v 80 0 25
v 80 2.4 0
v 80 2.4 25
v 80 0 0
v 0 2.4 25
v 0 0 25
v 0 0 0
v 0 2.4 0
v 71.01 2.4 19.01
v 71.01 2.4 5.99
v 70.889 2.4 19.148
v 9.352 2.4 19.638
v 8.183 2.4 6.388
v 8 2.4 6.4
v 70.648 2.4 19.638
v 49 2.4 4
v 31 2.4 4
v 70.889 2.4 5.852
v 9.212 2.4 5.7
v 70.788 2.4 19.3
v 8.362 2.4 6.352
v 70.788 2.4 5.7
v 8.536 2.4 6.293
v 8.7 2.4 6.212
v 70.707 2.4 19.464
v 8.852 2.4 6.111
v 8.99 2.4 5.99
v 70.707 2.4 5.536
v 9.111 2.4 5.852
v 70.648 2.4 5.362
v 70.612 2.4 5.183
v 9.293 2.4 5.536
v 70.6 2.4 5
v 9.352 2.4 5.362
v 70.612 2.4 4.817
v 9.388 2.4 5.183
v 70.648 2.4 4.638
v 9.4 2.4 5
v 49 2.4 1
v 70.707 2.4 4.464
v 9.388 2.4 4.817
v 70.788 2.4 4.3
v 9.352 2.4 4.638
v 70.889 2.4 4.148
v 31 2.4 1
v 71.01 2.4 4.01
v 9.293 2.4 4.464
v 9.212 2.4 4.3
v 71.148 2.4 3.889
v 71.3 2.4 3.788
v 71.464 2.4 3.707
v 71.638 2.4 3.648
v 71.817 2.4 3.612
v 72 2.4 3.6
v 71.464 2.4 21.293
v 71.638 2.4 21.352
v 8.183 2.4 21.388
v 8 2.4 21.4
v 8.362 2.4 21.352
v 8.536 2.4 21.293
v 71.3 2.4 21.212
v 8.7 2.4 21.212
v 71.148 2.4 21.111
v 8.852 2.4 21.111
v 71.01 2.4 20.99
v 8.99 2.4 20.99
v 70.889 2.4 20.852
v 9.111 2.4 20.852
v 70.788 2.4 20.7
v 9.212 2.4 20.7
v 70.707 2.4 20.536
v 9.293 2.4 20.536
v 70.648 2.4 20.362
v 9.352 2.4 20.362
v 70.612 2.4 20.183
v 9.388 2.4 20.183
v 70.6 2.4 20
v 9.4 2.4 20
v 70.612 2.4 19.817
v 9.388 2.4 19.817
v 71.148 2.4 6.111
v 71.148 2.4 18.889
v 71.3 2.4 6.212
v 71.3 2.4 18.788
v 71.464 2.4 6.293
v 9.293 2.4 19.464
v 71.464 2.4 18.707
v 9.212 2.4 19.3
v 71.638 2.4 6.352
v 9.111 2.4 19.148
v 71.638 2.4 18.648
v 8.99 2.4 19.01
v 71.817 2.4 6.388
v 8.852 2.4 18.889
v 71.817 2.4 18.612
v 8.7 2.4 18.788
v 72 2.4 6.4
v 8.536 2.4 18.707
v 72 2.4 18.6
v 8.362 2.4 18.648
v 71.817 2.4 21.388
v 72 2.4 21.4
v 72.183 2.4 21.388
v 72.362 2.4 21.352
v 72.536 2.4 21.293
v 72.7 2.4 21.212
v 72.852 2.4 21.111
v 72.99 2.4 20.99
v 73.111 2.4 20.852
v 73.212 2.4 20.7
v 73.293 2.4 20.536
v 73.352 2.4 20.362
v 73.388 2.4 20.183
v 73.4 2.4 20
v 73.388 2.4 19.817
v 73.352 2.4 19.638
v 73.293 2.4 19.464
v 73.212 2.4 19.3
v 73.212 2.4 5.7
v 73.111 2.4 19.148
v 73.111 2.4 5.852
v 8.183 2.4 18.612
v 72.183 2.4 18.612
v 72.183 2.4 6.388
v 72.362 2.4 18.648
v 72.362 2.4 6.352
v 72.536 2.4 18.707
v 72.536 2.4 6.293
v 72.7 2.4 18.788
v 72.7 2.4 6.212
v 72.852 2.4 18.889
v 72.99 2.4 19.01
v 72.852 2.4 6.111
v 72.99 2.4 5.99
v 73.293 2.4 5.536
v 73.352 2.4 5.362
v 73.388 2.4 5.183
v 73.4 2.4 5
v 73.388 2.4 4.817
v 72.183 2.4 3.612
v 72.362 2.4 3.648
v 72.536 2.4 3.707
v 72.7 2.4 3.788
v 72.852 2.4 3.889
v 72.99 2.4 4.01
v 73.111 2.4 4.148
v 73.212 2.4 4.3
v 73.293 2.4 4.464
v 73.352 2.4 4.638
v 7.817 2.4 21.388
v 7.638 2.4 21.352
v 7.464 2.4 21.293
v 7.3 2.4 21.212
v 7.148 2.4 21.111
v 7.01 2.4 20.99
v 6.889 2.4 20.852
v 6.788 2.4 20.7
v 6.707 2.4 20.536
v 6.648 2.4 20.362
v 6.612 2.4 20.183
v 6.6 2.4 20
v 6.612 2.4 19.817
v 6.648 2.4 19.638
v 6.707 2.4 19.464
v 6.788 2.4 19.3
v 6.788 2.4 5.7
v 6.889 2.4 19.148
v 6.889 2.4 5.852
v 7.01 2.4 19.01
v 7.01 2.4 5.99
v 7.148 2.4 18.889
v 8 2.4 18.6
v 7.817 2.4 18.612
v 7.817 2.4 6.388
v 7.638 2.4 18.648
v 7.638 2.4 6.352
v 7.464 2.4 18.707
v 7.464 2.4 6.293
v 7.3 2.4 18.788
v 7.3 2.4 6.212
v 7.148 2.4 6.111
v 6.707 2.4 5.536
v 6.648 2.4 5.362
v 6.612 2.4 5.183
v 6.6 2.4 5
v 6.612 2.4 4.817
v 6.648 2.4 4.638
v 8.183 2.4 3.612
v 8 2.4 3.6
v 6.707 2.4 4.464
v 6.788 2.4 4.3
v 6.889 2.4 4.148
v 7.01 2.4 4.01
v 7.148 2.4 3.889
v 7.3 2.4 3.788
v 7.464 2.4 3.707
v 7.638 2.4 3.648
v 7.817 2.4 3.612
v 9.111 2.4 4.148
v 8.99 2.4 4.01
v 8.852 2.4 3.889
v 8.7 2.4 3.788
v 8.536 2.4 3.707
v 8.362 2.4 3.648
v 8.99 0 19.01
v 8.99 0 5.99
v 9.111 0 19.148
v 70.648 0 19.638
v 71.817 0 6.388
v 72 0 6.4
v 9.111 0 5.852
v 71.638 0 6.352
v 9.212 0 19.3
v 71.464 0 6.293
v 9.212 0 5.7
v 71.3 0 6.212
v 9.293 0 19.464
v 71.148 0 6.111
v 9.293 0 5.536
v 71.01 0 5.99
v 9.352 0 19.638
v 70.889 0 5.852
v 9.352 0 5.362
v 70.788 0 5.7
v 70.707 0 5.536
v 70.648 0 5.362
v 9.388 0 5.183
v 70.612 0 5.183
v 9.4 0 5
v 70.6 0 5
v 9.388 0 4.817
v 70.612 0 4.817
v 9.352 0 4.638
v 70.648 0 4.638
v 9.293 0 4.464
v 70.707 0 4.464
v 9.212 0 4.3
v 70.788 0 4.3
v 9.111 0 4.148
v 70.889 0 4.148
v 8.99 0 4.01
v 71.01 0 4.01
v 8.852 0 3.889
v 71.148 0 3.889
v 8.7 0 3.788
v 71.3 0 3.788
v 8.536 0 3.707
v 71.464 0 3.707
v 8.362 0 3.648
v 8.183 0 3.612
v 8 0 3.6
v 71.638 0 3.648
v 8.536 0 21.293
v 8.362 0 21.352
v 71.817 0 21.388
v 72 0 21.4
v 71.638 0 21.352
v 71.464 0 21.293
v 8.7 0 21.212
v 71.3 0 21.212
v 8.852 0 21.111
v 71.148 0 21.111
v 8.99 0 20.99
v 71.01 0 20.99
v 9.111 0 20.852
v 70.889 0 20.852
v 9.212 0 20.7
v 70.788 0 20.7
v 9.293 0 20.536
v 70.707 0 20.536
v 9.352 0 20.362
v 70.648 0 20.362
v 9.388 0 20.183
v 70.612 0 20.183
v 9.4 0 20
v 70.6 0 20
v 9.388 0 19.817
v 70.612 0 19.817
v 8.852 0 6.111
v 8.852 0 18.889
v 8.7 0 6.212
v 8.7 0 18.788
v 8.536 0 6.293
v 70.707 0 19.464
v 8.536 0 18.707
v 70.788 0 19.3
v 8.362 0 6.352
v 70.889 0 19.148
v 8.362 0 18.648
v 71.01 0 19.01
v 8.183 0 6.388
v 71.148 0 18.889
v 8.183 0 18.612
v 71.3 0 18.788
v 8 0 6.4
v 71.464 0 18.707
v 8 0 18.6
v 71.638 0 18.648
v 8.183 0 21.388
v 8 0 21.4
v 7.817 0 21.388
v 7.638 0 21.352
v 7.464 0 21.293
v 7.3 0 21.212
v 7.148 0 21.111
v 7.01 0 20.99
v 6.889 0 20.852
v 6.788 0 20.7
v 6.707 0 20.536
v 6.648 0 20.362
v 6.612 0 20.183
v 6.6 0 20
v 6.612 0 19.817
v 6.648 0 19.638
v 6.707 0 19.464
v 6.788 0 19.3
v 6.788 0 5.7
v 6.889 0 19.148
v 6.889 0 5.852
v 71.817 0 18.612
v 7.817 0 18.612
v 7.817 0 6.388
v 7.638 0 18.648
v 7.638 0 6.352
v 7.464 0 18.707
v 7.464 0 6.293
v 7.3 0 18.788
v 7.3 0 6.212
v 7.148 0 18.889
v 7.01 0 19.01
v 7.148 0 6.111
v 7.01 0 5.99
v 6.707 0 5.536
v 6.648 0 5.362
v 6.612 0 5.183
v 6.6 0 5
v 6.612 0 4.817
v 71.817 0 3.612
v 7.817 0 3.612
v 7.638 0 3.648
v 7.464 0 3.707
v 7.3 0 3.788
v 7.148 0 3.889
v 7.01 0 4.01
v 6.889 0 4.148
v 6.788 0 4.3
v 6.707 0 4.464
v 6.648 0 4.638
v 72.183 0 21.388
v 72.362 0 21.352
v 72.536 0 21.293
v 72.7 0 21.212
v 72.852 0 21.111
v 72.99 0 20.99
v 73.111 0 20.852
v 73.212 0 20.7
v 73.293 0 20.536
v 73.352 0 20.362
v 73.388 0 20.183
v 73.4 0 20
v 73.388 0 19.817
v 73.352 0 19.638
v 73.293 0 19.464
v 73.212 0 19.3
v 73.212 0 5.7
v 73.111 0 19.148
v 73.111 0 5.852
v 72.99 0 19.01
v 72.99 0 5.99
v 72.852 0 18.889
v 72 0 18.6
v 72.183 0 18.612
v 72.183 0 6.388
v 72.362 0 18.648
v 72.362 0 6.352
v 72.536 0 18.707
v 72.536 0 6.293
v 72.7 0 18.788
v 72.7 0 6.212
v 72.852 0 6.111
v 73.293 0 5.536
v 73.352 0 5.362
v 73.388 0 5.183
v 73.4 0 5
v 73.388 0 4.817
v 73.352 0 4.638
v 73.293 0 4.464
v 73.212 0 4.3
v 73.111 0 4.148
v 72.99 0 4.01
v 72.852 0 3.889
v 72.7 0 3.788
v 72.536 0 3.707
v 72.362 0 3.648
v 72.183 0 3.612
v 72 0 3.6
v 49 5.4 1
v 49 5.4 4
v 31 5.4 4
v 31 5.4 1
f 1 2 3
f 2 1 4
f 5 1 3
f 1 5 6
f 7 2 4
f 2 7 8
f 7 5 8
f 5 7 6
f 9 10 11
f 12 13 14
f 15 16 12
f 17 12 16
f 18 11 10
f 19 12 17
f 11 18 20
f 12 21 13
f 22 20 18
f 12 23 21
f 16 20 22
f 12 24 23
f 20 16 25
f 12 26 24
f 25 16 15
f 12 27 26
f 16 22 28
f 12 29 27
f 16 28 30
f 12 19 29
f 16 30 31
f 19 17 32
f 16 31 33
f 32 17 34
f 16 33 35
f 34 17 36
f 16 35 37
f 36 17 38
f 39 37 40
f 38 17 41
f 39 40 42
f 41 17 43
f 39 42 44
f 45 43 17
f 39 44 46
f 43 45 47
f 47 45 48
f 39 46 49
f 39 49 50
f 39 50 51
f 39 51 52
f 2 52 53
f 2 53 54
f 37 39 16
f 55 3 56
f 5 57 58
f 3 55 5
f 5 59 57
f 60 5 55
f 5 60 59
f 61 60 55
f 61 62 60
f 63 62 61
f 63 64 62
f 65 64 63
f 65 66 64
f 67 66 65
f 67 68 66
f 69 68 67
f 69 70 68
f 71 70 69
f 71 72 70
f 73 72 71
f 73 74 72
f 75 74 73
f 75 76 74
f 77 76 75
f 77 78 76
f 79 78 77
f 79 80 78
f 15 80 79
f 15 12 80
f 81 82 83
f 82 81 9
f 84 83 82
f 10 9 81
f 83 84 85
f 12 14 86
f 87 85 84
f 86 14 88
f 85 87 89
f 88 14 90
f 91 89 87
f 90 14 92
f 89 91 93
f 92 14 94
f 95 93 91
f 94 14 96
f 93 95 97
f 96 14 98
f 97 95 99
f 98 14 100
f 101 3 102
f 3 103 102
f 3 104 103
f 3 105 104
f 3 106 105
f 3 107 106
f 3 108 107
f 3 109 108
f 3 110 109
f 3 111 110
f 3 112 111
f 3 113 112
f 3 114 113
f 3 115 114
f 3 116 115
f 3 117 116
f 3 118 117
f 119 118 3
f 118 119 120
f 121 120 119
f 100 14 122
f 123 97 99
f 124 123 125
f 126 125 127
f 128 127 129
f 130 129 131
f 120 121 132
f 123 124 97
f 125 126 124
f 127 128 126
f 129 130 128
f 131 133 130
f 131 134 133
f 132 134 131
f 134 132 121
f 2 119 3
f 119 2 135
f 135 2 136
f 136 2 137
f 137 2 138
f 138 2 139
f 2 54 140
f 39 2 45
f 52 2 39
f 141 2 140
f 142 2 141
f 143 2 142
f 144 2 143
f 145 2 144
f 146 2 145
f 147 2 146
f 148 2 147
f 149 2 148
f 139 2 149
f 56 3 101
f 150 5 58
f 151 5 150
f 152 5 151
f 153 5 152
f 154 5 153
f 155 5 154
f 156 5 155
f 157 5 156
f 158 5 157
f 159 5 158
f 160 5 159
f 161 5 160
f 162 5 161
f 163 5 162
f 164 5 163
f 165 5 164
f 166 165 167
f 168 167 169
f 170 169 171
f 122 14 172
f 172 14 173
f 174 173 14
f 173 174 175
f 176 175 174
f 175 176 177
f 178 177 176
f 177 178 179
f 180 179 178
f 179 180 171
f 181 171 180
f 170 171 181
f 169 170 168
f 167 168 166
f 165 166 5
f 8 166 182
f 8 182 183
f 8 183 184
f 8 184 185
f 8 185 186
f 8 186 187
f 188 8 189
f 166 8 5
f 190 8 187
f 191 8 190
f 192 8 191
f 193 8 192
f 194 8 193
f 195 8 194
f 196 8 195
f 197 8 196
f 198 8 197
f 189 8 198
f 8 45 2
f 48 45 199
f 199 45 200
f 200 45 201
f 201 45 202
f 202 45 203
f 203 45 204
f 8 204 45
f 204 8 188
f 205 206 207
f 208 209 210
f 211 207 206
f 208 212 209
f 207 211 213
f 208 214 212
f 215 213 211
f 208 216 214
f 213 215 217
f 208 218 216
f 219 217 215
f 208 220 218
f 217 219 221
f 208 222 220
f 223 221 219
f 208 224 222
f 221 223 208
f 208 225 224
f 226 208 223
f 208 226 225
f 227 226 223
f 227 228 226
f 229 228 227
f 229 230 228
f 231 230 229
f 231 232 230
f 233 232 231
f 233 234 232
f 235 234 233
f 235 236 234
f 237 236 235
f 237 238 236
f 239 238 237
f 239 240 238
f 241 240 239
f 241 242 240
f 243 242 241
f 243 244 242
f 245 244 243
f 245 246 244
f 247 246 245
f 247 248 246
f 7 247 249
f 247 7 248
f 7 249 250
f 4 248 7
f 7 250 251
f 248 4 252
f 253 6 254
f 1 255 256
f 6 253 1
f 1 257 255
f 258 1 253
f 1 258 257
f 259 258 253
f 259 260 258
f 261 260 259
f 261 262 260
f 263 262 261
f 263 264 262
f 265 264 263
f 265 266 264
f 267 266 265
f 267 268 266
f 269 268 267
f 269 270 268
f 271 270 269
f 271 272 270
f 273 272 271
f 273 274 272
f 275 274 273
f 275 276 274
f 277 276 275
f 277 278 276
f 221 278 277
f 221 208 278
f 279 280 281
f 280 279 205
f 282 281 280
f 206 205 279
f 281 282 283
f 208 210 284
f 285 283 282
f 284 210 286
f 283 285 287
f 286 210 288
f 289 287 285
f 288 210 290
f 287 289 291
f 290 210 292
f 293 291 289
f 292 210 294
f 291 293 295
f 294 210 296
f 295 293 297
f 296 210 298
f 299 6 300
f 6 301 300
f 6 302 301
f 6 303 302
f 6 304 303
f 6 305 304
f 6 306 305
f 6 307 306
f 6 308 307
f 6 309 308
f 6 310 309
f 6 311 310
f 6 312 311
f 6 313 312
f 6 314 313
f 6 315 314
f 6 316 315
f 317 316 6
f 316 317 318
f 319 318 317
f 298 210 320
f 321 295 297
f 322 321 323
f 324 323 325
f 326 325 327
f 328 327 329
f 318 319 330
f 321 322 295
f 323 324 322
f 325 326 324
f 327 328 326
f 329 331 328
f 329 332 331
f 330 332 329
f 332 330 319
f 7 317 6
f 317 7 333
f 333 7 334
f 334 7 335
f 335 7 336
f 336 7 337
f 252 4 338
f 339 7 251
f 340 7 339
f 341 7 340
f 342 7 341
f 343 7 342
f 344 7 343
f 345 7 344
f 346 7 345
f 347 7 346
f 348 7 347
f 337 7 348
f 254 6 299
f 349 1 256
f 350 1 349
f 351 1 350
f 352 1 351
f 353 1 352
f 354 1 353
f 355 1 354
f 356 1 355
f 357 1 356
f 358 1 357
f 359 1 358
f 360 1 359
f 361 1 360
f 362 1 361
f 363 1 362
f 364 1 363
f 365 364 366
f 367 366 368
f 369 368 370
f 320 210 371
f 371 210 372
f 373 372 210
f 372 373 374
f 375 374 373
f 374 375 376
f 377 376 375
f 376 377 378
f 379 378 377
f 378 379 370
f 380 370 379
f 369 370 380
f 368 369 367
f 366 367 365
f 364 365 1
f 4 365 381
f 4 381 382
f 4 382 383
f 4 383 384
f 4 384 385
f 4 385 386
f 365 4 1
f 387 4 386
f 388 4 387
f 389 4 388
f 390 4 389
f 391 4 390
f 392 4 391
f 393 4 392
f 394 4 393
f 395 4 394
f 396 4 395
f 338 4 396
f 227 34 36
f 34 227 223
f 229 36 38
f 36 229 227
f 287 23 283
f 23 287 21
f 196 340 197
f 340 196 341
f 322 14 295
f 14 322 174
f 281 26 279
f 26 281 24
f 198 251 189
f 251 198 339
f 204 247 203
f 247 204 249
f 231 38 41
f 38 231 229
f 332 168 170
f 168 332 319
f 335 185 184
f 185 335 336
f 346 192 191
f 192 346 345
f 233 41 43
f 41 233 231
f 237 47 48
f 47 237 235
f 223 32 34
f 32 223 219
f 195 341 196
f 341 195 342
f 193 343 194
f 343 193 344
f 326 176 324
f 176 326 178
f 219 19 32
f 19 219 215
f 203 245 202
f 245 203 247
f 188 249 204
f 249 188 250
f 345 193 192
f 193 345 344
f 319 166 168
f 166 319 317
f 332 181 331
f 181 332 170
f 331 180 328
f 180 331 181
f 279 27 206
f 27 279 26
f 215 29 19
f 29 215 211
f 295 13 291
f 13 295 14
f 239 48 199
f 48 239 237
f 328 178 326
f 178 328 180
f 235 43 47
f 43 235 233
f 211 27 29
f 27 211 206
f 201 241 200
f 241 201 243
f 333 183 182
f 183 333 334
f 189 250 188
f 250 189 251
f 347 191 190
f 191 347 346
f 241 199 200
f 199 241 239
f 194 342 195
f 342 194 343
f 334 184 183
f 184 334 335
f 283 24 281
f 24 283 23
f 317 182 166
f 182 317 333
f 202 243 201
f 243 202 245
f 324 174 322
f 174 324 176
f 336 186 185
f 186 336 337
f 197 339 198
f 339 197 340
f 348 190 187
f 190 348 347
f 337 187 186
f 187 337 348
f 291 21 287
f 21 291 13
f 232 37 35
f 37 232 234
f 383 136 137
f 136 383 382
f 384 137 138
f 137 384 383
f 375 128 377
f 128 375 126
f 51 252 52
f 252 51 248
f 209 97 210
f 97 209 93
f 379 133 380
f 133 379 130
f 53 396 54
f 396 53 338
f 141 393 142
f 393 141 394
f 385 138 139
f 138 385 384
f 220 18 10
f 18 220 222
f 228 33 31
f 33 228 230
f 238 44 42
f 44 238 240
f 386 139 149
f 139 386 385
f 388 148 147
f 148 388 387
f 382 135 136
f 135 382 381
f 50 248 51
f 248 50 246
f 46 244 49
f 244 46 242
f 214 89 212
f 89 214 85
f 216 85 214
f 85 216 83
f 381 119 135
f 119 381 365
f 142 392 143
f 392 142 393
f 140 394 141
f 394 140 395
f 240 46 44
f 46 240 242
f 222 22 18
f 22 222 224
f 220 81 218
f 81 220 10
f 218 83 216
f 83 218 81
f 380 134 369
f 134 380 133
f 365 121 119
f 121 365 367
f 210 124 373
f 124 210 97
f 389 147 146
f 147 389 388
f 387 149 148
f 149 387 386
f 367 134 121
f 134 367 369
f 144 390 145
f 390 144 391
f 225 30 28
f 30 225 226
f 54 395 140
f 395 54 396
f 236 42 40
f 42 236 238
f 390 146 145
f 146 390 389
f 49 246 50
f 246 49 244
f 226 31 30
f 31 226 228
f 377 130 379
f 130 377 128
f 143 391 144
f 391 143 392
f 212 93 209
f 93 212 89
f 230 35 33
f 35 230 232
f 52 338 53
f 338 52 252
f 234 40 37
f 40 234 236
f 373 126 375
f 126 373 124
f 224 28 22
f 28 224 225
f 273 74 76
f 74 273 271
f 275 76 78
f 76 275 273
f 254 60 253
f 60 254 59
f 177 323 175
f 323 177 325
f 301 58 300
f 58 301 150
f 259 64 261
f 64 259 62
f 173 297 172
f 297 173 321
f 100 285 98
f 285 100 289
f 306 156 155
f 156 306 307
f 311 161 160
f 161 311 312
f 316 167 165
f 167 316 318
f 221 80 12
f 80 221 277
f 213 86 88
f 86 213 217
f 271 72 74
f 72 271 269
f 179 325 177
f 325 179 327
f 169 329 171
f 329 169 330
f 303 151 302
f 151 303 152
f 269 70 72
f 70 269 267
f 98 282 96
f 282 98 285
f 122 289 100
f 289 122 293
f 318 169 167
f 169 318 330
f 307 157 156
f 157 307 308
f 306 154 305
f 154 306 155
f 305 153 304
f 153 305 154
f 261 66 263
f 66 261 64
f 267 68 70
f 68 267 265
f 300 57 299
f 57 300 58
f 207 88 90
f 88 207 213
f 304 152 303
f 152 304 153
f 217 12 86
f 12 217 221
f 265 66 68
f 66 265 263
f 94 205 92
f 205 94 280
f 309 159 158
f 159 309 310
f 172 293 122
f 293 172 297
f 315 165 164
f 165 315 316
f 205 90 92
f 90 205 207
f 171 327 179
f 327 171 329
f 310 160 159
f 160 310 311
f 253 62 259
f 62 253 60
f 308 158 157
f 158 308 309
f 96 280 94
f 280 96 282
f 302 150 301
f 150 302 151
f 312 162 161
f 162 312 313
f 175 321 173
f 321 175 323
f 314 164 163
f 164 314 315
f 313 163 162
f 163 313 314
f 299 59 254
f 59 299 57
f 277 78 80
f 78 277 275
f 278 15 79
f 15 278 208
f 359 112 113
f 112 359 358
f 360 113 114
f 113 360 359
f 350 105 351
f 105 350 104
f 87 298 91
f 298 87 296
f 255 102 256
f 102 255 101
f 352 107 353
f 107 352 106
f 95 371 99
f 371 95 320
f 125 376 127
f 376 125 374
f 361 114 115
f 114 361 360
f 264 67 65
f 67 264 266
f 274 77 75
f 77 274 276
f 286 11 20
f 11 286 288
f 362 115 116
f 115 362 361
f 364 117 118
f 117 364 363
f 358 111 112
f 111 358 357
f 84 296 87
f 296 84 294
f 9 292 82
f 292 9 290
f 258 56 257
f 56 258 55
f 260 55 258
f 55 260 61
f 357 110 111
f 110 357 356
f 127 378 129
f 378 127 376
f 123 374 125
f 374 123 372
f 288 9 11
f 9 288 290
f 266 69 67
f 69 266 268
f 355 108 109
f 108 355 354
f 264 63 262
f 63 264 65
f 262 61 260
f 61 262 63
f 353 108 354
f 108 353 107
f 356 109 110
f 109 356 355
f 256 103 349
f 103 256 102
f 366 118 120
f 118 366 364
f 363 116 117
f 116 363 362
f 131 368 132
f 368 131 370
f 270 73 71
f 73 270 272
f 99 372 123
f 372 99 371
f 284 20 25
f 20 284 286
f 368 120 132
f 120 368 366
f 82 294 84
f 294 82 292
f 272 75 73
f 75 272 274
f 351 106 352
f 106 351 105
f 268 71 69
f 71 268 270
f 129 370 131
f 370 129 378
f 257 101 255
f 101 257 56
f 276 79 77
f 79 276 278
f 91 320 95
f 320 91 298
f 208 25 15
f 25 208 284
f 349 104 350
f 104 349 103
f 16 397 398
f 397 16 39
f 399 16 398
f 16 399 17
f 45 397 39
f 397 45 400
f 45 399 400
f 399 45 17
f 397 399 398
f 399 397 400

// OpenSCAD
// Status Beacon v0.1 Rear Cover
// Four M2 screws recommended.

$fn = 48;

difference() {
    cube([80,2.4,25]);

    // Screw holes
    translate([8,1.2,5]) rotate([90,0,0]) cylinder(h=4,d=2.8,center=true);
    translate([72,1.2,5]) rotate([90,0,0]) cylinder(h=4,d=2.8,center=true);
    translate([8,1.2,20]) rotate([90,0,0]) cylinder(h=4,d=2.8,center=true);
    translate([72,1.2,20]) rotate([90,0,0]) cylinder(h=4,d=2.8,center=true);
}

// small pull lip
translate([31,2.4,1]) cube([18,3,3]);
